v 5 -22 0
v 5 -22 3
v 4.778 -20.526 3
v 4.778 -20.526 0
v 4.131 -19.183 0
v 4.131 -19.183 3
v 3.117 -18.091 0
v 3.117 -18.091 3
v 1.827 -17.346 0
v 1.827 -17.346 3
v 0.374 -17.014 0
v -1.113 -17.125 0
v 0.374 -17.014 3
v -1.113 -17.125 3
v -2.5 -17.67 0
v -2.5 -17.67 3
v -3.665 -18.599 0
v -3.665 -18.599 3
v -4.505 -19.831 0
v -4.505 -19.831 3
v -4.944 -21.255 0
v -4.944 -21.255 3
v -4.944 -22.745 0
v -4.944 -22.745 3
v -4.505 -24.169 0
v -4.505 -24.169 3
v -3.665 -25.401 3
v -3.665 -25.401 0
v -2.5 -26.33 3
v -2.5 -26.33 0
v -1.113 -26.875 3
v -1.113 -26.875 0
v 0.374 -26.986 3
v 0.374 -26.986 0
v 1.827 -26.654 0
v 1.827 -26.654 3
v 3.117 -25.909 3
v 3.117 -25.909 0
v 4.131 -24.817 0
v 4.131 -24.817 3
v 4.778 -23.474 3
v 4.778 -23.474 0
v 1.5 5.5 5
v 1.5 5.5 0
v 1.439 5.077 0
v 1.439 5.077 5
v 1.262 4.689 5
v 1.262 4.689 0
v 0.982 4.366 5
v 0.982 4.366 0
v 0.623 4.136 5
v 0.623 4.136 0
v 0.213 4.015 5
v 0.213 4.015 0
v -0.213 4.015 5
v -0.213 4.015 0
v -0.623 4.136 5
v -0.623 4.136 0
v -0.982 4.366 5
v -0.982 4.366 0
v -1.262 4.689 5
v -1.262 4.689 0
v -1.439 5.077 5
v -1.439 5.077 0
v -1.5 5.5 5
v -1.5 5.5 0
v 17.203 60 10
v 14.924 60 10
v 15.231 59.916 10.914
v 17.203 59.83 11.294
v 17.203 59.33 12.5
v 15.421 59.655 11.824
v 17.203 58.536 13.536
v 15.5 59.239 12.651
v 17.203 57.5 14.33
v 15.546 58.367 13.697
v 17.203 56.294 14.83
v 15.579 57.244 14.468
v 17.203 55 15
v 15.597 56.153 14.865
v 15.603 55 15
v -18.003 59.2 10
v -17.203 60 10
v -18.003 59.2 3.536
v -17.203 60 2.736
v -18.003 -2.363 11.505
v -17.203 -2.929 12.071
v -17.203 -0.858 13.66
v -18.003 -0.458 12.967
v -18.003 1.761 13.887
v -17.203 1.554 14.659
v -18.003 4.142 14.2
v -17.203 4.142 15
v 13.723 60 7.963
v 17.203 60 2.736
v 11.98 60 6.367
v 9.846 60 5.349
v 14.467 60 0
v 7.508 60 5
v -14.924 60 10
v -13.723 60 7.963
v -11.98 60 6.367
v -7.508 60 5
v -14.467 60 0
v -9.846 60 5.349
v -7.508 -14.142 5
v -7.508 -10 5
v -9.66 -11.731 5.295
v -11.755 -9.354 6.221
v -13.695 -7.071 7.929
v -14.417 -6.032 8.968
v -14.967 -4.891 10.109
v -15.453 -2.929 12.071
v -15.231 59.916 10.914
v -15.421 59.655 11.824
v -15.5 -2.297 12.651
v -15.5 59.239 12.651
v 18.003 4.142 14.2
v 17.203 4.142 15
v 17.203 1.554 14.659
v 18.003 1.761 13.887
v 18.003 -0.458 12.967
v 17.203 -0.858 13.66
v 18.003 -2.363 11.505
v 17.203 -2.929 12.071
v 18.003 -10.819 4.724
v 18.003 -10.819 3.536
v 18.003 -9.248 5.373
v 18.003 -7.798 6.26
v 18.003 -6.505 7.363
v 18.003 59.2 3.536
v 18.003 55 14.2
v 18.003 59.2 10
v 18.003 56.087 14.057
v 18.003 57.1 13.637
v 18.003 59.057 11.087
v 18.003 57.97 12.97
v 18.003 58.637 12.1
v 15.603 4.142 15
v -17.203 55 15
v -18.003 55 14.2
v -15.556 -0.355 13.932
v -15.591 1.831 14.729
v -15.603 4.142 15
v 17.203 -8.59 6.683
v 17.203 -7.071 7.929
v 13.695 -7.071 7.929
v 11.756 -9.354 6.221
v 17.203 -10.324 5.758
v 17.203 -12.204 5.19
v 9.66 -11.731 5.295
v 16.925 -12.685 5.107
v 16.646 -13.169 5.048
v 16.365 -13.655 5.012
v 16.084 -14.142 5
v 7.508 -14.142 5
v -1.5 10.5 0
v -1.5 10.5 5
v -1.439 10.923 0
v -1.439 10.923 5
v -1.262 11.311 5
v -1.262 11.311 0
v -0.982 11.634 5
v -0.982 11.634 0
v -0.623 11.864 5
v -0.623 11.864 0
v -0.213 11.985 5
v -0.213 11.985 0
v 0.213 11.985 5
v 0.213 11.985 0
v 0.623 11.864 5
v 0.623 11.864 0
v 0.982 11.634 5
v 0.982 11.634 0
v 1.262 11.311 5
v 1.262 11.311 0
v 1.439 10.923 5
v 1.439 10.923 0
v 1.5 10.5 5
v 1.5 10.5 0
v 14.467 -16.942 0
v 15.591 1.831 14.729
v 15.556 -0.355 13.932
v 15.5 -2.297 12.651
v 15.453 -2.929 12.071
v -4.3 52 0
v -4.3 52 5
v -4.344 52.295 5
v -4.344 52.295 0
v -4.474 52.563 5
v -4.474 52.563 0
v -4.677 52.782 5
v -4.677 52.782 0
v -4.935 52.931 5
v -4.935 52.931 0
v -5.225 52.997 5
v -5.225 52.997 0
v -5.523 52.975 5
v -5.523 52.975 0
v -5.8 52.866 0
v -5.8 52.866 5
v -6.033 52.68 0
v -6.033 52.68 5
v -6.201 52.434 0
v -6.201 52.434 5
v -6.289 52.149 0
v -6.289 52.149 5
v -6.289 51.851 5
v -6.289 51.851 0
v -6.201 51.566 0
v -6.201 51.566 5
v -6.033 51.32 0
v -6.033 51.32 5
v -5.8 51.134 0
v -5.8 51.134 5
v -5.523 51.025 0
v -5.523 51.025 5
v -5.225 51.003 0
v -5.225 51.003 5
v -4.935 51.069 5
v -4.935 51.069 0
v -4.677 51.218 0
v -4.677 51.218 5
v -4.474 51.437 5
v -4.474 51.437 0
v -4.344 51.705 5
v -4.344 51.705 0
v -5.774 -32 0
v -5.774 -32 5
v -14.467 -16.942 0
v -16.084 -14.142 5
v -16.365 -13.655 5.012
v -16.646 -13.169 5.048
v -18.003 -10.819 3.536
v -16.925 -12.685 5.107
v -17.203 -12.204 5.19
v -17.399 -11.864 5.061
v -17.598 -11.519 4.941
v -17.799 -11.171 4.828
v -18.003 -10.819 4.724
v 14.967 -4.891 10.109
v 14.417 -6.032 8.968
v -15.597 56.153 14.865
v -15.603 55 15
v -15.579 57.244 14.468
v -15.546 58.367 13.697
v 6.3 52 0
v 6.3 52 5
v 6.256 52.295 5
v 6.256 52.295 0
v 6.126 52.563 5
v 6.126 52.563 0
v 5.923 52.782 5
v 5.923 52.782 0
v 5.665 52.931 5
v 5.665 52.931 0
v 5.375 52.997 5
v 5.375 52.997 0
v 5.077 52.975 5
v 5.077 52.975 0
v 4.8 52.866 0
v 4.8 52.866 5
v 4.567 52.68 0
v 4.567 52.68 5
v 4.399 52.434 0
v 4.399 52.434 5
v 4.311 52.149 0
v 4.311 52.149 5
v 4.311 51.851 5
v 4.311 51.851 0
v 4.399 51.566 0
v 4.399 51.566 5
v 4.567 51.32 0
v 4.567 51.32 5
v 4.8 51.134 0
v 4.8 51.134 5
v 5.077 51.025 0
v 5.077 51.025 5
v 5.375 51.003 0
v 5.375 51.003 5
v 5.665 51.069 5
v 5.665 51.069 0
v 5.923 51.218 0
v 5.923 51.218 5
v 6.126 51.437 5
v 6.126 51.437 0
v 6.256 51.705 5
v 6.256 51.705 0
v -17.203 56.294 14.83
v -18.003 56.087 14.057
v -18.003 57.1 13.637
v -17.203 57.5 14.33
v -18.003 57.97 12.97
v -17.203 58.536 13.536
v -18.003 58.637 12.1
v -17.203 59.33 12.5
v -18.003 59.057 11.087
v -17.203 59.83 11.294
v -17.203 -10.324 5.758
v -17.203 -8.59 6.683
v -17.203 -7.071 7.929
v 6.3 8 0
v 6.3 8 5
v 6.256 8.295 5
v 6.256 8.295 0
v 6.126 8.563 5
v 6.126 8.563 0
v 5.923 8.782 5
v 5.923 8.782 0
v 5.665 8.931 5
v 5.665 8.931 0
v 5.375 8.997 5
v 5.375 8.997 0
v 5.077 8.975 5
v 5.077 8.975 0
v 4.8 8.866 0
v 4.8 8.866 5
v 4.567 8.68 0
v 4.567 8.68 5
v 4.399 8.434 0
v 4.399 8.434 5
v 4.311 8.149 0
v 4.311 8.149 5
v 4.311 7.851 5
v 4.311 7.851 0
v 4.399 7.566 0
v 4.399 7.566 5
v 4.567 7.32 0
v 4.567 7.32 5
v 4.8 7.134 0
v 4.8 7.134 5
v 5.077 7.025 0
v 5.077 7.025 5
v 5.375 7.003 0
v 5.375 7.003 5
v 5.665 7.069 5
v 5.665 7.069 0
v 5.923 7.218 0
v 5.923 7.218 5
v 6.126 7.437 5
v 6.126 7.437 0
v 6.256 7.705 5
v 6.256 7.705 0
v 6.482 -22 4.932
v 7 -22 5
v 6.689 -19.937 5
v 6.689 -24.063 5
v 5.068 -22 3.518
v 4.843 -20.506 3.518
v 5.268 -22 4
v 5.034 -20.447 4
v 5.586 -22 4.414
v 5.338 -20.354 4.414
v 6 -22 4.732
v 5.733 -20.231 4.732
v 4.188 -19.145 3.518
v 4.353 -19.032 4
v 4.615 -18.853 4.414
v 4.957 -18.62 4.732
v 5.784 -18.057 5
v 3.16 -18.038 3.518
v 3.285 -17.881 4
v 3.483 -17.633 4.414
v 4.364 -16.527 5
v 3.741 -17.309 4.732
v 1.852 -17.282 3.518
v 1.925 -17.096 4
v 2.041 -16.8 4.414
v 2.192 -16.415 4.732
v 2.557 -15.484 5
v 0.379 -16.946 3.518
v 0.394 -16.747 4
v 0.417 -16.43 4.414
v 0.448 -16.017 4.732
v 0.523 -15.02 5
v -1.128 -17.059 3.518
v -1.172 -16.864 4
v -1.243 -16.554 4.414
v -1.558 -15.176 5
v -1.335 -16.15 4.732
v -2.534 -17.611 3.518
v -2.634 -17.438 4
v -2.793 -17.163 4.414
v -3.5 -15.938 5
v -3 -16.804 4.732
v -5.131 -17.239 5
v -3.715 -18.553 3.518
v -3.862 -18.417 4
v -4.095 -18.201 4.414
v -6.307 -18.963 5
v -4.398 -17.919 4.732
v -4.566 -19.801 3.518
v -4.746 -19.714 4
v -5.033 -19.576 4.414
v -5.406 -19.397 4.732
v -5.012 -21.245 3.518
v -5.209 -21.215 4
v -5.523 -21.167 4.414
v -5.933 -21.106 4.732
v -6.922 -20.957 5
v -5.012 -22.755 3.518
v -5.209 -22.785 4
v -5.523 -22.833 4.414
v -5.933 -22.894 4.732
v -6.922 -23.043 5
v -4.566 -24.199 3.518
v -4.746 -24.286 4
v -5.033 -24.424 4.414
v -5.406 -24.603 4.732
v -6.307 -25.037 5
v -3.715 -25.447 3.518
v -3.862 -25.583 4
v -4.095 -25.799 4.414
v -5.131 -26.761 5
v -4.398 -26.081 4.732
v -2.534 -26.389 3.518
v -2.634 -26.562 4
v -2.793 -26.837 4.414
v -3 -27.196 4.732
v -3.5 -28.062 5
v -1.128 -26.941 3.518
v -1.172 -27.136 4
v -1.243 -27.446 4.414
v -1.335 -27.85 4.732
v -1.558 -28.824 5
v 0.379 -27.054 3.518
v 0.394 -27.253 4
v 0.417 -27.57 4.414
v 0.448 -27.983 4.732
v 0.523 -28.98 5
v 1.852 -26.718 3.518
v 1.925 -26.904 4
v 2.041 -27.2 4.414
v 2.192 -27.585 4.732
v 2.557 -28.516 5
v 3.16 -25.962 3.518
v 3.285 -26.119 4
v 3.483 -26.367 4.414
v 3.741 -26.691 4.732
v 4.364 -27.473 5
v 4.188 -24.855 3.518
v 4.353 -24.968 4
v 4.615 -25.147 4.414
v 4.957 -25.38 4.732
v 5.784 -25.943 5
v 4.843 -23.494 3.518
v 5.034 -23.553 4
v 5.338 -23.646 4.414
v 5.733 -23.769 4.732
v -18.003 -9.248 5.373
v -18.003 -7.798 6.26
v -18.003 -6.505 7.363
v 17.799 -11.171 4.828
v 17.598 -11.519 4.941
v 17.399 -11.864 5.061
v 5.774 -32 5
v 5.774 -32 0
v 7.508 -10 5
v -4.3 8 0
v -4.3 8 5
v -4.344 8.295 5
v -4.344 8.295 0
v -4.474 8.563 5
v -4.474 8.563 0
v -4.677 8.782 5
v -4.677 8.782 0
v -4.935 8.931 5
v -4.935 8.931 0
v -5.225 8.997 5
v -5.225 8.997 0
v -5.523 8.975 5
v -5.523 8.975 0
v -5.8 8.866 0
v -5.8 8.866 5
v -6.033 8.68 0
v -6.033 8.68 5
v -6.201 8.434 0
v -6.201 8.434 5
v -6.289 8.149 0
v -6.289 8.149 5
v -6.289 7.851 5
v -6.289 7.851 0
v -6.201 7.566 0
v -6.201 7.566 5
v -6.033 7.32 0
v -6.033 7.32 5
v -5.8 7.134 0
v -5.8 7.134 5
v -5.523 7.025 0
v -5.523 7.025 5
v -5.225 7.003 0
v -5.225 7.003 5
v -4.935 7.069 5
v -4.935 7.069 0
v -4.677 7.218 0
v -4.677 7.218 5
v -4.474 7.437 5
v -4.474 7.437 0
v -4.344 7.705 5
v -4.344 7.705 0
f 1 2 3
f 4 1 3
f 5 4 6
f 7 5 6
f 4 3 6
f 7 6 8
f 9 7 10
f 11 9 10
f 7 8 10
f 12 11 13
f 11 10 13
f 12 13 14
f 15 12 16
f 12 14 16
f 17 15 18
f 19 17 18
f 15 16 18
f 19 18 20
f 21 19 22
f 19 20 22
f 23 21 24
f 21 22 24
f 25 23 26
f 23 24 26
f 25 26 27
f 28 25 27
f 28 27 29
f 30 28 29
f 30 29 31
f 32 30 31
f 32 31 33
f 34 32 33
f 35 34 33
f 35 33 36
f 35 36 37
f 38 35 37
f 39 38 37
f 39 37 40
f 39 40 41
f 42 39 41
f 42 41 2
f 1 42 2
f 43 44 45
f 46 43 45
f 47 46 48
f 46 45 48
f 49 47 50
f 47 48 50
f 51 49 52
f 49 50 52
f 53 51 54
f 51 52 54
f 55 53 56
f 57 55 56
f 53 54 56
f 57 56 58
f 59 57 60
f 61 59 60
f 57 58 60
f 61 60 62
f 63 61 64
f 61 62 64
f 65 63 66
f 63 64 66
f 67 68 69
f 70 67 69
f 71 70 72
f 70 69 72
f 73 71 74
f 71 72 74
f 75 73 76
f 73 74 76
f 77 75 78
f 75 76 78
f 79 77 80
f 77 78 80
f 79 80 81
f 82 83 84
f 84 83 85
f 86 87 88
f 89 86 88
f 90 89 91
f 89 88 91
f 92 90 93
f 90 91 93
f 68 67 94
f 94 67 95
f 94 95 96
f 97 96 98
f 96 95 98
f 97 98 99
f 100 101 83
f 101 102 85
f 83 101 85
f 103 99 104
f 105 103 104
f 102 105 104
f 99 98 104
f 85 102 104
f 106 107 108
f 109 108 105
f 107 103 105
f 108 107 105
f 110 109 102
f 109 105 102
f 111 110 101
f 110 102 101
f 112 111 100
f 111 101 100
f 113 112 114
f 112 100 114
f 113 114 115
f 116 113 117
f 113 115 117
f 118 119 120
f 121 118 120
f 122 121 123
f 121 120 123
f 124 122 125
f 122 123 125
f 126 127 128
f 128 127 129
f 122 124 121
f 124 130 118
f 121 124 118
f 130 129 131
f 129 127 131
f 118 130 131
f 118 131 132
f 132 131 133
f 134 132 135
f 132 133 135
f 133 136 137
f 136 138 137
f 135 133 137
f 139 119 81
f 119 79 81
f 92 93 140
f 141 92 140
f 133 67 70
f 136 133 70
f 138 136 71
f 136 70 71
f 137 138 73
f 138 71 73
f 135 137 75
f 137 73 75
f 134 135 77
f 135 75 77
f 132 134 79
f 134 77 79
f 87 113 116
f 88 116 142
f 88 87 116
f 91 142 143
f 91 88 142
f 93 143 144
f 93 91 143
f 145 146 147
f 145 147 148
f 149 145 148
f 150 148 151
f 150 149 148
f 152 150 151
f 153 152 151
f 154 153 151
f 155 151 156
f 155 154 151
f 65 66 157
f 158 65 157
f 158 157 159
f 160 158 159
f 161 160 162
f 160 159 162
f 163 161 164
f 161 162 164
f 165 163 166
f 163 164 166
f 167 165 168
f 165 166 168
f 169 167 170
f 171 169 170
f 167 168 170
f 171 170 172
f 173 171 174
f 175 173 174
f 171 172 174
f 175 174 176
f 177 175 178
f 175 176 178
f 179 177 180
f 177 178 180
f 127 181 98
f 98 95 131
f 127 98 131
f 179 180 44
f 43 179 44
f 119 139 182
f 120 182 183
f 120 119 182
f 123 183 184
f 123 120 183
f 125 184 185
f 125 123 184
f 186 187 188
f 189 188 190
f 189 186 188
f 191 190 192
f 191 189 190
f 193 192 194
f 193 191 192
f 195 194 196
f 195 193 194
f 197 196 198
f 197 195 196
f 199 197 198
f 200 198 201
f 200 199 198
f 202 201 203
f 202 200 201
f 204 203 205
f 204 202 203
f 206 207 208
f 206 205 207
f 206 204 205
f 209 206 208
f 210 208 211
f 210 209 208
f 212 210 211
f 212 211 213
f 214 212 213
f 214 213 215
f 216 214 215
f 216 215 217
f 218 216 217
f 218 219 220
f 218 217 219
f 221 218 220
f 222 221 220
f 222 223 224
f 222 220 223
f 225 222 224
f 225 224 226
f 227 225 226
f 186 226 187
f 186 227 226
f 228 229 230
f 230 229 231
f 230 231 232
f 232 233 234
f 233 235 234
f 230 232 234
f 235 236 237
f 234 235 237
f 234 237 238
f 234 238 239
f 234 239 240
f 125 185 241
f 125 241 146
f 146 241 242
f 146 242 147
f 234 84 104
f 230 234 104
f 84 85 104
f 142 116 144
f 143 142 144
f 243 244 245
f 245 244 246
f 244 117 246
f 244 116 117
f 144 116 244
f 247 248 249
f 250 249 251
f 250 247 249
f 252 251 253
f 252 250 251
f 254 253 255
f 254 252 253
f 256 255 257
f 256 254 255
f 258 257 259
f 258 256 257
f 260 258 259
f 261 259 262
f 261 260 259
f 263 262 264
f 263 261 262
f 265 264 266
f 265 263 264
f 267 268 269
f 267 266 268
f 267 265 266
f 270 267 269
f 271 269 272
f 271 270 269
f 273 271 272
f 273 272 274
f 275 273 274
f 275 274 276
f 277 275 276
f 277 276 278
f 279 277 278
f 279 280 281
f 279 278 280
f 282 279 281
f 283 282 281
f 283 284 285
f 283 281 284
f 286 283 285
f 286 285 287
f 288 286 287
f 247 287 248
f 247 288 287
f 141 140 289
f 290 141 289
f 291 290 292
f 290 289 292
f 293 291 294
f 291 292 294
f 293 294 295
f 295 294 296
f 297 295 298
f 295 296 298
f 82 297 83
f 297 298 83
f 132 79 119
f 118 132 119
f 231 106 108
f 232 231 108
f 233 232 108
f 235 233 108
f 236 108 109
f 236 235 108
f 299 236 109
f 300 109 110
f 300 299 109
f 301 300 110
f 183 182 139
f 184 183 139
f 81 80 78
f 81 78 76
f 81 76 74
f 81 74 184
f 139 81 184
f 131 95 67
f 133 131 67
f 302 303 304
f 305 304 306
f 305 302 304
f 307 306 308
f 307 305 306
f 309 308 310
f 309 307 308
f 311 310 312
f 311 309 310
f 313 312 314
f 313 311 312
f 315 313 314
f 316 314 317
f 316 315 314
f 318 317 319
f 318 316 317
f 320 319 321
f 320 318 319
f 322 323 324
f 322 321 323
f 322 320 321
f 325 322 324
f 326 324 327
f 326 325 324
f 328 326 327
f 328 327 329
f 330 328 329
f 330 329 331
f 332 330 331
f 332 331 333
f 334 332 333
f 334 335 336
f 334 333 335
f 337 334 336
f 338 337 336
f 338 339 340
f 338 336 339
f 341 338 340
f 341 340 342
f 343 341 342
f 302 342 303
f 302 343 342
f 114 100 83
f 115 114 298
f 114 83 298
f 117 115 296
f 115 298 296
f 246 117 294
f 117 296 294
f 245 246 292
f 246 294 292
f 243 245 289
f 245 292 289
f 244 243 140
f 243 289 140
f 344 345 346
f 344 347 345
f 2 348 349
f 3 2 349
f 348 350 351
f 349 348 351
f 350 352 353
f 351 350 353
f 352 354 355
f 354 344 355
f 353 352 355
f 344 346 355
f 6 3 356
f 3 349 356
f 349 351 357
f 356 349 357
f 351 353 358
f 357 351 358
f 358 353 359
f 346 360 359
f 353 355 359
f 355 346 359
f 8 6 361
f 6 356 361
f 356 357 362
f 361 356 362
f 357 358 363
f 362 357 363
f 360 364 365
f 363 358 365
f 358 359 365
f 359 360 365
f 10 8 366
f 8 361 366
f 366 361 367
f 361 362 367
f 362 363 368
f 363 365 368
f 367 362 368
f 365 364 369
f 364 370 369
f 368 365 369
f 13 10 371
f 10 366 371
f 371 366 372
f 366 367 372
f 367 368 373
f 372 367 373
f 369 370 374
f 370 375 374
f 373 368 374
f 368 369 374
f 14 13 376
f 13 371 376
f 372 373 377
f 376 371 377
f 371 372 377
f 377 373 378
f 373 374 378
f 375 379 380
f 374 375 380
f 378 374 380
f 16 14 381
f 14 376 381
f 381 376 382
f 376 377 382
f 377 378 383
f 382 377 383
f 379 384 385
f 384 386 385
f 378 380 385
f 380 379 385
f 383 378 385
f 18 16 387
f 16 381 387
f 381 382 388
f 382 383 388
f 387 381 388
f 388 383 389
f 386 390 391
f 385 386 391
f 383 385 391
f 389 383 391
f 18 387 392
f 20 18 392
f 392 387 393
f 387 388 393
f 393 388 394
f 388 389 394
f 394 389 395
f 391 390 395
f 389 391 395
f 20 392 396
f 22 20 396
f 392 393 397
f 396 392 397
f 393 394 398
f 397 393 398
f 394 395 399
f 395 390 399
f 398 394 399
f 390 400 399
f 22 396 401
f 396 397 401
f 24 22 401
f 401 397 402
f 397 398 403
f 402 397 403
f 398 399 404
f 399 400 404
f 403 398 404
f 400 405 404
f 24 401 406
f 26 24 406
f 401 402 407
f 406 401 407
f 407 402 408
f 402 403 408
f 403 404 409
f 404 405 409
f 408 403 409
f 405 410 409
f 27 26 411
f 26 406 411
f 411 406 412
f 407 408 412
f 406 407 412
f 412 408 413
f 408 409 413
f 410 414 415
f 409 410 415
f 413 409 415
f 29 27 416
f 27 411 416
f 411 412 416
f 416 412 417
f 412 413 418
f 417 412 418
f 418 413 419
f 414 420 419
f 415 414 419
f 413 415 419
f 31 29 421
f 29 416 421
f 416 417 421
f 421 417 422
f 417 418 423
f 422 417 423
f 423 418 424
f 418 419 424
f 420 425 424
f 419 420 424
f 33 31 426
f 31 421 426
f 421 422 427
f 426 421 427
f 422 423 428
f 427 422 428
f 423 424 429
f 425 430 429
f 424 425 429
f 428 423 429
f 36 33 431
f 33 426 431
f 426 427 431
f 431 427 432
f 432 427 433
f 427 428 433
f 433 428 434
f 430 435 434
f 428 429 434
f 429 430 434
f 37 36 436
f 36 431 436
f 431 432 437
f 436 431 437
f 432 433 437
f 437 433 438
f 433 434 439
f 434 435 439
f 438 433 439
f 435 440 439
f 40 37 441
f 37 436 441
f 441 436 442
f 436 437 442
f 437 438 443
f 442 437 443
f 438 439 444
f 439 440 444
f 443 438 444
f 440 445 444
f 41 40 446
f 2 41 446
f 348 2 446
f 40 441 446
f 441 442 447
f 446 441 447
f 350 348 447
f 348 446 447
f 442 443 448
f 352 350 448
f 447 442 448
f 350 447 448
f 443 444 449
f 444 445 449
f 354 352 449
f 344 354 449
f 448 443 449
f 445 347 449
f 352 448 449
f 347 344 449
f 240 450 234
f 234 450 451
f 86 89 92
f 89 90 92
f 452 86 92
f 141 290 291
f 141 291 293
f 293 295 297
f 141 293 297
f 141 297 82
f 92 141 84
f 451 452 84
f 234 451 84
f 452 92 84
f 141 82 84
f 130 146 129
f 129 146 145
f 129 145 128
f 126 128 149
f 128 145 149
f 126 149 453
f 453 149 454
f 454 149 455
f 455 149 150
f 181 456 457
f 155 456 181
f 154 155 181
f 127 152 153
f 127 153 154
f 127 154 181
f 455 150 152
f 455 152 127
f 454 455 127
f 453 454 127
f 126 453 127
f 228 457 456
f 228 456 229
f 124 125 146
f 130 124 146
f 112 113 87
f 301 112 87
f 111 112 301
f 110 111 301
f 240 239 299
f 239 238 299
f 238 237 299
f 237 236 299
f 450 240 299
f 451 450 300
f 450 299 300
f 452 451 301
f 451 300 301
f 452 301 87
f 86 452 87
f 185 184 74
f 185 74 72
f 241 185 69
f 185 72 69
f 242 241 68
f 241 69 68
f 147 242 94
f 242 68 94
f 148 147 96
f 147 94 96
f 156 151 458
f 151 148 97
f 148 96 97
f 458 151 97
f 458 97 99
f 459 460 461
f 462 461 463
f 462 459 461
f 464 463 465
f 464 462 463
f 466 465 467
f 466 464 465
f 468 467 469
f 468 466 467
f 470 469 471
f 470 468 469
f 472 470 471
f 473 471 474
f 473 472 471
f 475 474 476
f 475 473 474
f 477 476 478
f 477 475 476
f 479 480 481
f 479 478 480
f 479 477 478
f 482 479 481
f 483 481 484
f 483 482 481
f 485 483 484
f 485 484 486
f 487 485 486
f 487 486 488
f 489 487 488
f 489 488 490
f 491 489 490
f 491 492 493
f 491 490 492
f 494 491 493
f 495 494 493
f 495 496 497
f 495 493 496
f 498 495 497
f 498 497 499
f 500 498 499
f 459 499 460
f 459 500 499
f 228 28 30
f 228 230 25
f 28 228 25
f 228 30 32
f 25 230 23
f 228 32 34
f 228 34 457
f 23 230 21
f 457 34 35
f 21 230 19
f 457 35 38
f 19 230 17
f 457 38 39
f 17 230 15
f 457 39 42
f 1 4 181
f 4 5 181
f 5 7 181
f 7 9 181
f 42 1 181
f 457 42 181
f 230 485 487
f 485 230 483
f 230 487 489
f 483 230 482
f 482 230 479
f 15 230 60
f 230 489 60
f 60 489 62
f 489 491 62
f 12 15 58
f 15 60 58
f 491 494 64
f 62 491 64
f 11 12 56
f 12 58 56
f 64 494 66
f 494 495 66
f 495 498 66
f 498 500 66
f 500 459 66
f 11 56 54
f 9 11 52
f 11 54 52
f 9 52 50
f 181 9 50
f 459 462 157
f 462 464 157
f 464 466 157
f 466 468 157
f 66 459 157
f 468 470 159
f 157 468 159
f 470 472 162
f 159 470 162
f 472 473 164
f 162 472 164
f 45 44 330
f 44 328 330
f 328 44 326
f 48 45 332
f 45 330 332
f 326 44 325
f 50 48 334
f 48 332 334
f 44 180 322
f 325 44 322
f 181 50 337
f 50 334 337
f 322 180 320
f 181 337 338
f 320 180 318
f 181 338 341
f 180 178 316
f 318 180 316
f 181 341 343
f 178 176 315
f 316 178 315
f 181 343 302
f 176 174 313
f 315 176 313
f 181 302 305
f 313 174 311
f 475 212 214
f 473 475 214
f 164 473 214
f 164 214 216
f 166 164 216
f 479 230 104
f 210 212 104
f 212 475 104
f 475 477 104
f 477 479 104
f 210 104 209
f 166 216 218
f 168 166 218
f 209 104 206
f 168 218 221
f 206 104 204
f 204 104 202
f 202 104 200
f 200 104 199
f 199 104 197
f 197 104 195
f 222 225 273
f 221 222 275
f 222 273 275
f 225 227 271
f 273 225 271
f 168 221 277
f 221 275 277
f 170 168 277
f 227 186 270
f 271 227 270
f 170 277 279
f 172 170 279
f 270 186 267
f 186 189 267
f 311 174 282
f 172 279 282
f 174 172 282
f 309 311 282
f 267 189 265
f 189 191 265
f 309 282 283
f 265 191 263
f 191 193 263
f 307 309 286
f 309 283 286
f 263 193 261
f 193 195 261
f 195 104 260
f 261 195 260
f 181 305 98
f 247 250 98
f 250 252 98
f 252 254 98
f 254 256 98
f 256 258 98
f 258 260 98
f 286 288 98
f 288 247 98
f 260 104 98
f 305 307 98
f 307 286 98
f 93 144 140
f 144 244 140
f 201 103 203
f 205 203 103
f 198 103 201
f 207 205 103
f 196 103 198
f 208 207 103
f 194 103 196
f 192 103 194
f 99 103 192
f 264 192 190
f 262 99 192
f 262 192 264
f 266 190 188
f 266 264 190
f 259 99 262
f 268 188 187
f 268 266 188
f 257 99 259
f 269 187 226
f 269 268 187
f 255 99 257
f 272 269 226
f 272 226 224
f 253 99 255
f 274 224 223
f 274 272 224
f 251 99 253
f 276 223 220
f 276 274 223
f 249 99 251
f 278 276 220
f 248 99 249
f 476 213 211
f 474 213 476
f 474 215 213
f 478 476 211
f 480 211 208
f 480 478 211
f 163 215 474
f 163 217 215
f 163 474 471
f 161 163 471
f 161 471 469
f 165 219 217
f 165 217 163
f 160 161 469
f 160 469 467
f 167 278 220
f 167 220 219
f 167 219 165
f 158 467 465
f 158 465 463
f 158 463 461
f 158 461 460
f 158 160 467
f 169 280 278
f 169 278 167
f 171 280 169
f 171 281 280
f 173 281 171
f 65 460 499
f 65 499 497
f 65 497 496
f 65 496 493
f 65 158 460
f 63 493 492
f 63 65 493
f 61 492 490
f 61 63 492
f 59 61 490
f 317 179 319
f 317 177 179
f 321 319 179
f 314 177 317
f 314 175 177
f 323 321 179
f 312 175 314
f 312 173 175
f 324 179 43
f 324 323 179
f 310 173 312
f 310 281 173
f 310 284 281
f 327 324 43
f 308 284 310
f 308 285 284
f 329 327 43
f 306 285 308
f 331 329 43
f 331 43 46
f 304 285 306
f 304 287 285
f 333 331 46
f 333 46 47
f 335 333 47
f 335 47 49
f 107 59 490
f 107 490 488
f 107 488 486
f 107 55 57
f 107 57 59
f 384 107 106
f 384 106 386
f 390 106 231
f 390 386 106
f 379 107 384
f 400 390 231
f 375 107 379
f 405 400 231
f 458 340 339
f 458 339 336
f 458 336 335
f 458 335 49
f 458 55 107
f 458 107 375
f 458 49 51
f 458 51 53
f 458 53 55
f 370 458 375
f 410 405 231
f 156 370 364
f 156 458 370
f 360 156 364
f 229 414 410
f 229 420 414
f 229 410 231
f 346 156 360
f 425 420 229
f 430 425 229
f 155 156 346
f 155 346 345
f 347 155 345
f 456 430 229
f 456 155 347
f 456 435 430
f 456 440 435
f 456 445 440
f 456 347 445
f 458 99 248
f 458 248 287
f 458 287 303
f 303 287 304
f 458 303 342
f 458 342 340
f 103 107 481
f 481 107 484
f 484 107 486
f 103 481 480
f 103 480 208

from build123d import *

# Parameters (mm, degrees)
BOSS_EXTRUDE1_DEPTH     = 60
BOSS_EXTRUDE2_DEPTH     = 32
CUT_EXTRUDE1_DEPTH      = 19.002558
CUT_EXTRUDE1_DEPTH_BACK = 19.002558
SKETCH3_R               = 5
CUT_EXTRUDE2_DEPTH      = 6
FILLET1_R               = 2
SKETCH4_R               = 1
CUT_EXTRUDE6_DEPTH      = 16
CUT_EXTRUDE6_DEPTH_BACK = 1
CUT_EXTRUDE7_DEPTH      = 16
FILLET2_R               = 5
FILLET3_R               = 10
FILLET4_R               = 10
CHAMFER2_SIZE           = 0.8


with BuildPart() as part:
    # Sketch1 → Boss-Extrude1 (new body)
    with BuildSketch(Plane(origin=(0, 0, 0), x_dir=(1, 0, 0), z_dir=(0, 1, 0))):
        with BuildLine():
            Line((-6.630435, 0), (6.630435, 0))
            Line((6.630435, 0), (14.467024, 0))
            Line((14.467024, 0), (18.002558, -3.535534))
            Line((18.002558, -3.535534), (18.002558, -15))
            Line((18.002558, -15), (15.602558, -15))
            Line((15.602558, -15), (15.5, -12.651045))
            ThreePointArc((15.5, -12.651045), (13.039719, -7.221088), (7.507614, -5))
            Line((7.507614, -5), (-7.507614, -5))
            ThreePointArc((-7.507614, -5), (-13.039719, -7.221088), (-15.5, -12.651045))
            Line((-15.5, -12.651045), (-15.602558, -15))
            Line((-15.602558, -15), (-18.002558, -15))
            Line((-18.002558, -15), (-18.002558, -3.535534))
            Line((-18.002558, -3.535534), (-14.467024, 0))
            Line((-14.467024, 0), (-6.630435, 0))
        make_face()
    extrude(amount=BOSS_EXTRUDE1_DEPTH)

    # Sketch1<2> → Boss-Extrude2 (add)
    with BuildSketch(Plane(origin=(0, 0, 0), x_dir=(1, 0, 0), z_dir=(0, 1, 0))):
        with BuildLine():
            Line((-6.630435, 0), (6.630435, 0))
            Line((6.630435, 0), (14.467024, 0))
            Line((14.467024, 0), (18.002558, -3.535534))
            Line((18.002558, -3.535534), (18.002558, -15))
            Line((18.002558, -15), (15.602558, -15))
            Line((15.602558, -15), (15.5, -12.651045))
            ThreePointArc((15.5, -12.651045), (13.039719, -7.221088), (7.507614, -5))
            Line((7.507614, -5), (-7.507614, -5))
            ThreePointArc((-7.507614, -5), (-13.039719, -7.221088), (-15.5, -12.651045))
            Line((-15.5, -12.651045), (-15.602558, -15))
            Line((-15.602558, -15), (-18.002558, -15))
            Line((-18.002558, -15), (-18.002558, -3.535534))
            Line((-18.002558, -3.535534), (-14.467024, 0))
            Line((-14.467024, 0), (-6.630435, 0))
        make_face()
    extrude(amount=-BOSS_EXTRUDE2_DEPTH)

    # Sketch2 → Cut-Extrude1 (cut, two sides)
    with BuildSketch(Plane(origin=(0, 0, 0), x_dir=(0, 0, -1), z_dir=(1, 0, 0))) as cut_extrude1_sk:
        Polygon((-15, 0), (-5, -10), (-5, -32), (-15, -32), align=None)
    extrude(amount=CUT_EXTRUDE1_DEPTH, mode=Mode.SUBTRACT)
    extrude(cut_extrude1_sk.sketch, amount=-CUT_EXTRUDE1_DEPTH_BACK, mode=Mode.SUBTRACT)

    # Sketch3 → Cut-Extrude2 (cut, through all)
    with BuildSketch(Plane.XY.offset(5)):
        with Locations((0, -22)):
            Circle(SKETCH3_R)
        Polygon((18.002558, -10.818656), (18.002558, -32), (5.773503, -32), align=None)
        Polygon((-18.002558, -32), (-5.773503, -32), (-18.002558, -10.818656), align=None)
    extrude(amount=-CUT_EXTRUDE2_DEPTH, mode=Mode.SUBTRACT)

    # Fillet1
    fillet1_edges = [part.edges().sort_by_distance(p)[0] for p in [
        (-5, -22, 5),
    ]]
    fillet(fillet1_edges, radius=FILLET1_R)

    # Sketch4 → Cut-Extrude6 (cut, two sides)
    with BuildSketch(Plane.XY) as cut_extrude6_sk:
        with Locations((5.3, 52)):
            Circle(SKETCH4_R)
        with Locations((-5.3, 52)):
            Circle(SKETCH4_R)
        with Locations((-5.3, 8)):
            Circle(SKETCH4_R)
        with Locations((5.3, 8)):
            Circle(SKETCH4_R)
    extrude(amount=CUT_EXTRUDE6_DEPTH, mode=Mode.SUBTRACT)
    extrude(cut_extrude6_sk.sketch, amount=-CUT_EXTRUDE6_DEPTH_BACK, mode=Mode.SUBTRACT)

    # Sketch5 → Cut-Extrude7 (cut, through all)
    with BuildSketch(Plane.XY):
        with BuildLine():
            Line((-1.5, 5.5), (-1.5, 10.5))
            ThreePointArc((-1.5, 10.5), (0, 12), (1.5, 10.5))
            Line((1.5, 10.5), (1.5, 5.5))
            ThreePointArc((1.5, 5.5), (0, 4), (-1.5, 5.5))
        make_face()
    extrude(amount=CUT_EXTRUDE7_DEPTH, mode=Mode.SUBTRACT)

    # Fillet2
    fillet2_edges = [part.edges().sort_by_distance(p)[0] for p in [
        (16.802558, 60, 15),
        (-16.802558, 60, 15),
    ]]
    fillet(fillet2_edges, radius=FILLET2_R)

    # Fillet3
    fillet3_edges = [part.edges().sort_by_distance(p)[0] for p in [
        (-16.802558, 0, 15),
        (16.802558, 0, 15),
    ]]
    fillet(fillet3_edges, radius=FILLET3_R)

    # Fillet4
    fillet4_edges = [part.edges().sort_by_distance(p)[0] for p in [
        (-12.755086, -10, 5),
        (12.755086, -10, 5),
    ]]
    fillet(fillet4_edges, radius=FILLET4_R)

    # Chamfer2
    chamfer2_edges = [part.edges().sort_by_distance(p)[0] for p in [
        (18.002558, -8.812535, 6.538596),
        (18.002558, 60, 6.767767),
        (18.002558, -5, 10),
        (18.002558, 58.535534, 13.535534),
        (18.002558, 0.315301, 14.238795),
        (18.002558, 29.571068, 15),
        (-18.002558, -8.812535, 6.538596),
        (-18.002558, 60, 6.767767),
        (-18.002558, -5, 10),
        (-18.002558, 58.535534, 13.535534),
        (-18.002558, 0.315301, 14.238795),
        (-18.002558, 29.571068, 15),
    ]]
    chamfer(chamfer2_edges, length=CHAMFER2_SIZE)


solid = part.part
